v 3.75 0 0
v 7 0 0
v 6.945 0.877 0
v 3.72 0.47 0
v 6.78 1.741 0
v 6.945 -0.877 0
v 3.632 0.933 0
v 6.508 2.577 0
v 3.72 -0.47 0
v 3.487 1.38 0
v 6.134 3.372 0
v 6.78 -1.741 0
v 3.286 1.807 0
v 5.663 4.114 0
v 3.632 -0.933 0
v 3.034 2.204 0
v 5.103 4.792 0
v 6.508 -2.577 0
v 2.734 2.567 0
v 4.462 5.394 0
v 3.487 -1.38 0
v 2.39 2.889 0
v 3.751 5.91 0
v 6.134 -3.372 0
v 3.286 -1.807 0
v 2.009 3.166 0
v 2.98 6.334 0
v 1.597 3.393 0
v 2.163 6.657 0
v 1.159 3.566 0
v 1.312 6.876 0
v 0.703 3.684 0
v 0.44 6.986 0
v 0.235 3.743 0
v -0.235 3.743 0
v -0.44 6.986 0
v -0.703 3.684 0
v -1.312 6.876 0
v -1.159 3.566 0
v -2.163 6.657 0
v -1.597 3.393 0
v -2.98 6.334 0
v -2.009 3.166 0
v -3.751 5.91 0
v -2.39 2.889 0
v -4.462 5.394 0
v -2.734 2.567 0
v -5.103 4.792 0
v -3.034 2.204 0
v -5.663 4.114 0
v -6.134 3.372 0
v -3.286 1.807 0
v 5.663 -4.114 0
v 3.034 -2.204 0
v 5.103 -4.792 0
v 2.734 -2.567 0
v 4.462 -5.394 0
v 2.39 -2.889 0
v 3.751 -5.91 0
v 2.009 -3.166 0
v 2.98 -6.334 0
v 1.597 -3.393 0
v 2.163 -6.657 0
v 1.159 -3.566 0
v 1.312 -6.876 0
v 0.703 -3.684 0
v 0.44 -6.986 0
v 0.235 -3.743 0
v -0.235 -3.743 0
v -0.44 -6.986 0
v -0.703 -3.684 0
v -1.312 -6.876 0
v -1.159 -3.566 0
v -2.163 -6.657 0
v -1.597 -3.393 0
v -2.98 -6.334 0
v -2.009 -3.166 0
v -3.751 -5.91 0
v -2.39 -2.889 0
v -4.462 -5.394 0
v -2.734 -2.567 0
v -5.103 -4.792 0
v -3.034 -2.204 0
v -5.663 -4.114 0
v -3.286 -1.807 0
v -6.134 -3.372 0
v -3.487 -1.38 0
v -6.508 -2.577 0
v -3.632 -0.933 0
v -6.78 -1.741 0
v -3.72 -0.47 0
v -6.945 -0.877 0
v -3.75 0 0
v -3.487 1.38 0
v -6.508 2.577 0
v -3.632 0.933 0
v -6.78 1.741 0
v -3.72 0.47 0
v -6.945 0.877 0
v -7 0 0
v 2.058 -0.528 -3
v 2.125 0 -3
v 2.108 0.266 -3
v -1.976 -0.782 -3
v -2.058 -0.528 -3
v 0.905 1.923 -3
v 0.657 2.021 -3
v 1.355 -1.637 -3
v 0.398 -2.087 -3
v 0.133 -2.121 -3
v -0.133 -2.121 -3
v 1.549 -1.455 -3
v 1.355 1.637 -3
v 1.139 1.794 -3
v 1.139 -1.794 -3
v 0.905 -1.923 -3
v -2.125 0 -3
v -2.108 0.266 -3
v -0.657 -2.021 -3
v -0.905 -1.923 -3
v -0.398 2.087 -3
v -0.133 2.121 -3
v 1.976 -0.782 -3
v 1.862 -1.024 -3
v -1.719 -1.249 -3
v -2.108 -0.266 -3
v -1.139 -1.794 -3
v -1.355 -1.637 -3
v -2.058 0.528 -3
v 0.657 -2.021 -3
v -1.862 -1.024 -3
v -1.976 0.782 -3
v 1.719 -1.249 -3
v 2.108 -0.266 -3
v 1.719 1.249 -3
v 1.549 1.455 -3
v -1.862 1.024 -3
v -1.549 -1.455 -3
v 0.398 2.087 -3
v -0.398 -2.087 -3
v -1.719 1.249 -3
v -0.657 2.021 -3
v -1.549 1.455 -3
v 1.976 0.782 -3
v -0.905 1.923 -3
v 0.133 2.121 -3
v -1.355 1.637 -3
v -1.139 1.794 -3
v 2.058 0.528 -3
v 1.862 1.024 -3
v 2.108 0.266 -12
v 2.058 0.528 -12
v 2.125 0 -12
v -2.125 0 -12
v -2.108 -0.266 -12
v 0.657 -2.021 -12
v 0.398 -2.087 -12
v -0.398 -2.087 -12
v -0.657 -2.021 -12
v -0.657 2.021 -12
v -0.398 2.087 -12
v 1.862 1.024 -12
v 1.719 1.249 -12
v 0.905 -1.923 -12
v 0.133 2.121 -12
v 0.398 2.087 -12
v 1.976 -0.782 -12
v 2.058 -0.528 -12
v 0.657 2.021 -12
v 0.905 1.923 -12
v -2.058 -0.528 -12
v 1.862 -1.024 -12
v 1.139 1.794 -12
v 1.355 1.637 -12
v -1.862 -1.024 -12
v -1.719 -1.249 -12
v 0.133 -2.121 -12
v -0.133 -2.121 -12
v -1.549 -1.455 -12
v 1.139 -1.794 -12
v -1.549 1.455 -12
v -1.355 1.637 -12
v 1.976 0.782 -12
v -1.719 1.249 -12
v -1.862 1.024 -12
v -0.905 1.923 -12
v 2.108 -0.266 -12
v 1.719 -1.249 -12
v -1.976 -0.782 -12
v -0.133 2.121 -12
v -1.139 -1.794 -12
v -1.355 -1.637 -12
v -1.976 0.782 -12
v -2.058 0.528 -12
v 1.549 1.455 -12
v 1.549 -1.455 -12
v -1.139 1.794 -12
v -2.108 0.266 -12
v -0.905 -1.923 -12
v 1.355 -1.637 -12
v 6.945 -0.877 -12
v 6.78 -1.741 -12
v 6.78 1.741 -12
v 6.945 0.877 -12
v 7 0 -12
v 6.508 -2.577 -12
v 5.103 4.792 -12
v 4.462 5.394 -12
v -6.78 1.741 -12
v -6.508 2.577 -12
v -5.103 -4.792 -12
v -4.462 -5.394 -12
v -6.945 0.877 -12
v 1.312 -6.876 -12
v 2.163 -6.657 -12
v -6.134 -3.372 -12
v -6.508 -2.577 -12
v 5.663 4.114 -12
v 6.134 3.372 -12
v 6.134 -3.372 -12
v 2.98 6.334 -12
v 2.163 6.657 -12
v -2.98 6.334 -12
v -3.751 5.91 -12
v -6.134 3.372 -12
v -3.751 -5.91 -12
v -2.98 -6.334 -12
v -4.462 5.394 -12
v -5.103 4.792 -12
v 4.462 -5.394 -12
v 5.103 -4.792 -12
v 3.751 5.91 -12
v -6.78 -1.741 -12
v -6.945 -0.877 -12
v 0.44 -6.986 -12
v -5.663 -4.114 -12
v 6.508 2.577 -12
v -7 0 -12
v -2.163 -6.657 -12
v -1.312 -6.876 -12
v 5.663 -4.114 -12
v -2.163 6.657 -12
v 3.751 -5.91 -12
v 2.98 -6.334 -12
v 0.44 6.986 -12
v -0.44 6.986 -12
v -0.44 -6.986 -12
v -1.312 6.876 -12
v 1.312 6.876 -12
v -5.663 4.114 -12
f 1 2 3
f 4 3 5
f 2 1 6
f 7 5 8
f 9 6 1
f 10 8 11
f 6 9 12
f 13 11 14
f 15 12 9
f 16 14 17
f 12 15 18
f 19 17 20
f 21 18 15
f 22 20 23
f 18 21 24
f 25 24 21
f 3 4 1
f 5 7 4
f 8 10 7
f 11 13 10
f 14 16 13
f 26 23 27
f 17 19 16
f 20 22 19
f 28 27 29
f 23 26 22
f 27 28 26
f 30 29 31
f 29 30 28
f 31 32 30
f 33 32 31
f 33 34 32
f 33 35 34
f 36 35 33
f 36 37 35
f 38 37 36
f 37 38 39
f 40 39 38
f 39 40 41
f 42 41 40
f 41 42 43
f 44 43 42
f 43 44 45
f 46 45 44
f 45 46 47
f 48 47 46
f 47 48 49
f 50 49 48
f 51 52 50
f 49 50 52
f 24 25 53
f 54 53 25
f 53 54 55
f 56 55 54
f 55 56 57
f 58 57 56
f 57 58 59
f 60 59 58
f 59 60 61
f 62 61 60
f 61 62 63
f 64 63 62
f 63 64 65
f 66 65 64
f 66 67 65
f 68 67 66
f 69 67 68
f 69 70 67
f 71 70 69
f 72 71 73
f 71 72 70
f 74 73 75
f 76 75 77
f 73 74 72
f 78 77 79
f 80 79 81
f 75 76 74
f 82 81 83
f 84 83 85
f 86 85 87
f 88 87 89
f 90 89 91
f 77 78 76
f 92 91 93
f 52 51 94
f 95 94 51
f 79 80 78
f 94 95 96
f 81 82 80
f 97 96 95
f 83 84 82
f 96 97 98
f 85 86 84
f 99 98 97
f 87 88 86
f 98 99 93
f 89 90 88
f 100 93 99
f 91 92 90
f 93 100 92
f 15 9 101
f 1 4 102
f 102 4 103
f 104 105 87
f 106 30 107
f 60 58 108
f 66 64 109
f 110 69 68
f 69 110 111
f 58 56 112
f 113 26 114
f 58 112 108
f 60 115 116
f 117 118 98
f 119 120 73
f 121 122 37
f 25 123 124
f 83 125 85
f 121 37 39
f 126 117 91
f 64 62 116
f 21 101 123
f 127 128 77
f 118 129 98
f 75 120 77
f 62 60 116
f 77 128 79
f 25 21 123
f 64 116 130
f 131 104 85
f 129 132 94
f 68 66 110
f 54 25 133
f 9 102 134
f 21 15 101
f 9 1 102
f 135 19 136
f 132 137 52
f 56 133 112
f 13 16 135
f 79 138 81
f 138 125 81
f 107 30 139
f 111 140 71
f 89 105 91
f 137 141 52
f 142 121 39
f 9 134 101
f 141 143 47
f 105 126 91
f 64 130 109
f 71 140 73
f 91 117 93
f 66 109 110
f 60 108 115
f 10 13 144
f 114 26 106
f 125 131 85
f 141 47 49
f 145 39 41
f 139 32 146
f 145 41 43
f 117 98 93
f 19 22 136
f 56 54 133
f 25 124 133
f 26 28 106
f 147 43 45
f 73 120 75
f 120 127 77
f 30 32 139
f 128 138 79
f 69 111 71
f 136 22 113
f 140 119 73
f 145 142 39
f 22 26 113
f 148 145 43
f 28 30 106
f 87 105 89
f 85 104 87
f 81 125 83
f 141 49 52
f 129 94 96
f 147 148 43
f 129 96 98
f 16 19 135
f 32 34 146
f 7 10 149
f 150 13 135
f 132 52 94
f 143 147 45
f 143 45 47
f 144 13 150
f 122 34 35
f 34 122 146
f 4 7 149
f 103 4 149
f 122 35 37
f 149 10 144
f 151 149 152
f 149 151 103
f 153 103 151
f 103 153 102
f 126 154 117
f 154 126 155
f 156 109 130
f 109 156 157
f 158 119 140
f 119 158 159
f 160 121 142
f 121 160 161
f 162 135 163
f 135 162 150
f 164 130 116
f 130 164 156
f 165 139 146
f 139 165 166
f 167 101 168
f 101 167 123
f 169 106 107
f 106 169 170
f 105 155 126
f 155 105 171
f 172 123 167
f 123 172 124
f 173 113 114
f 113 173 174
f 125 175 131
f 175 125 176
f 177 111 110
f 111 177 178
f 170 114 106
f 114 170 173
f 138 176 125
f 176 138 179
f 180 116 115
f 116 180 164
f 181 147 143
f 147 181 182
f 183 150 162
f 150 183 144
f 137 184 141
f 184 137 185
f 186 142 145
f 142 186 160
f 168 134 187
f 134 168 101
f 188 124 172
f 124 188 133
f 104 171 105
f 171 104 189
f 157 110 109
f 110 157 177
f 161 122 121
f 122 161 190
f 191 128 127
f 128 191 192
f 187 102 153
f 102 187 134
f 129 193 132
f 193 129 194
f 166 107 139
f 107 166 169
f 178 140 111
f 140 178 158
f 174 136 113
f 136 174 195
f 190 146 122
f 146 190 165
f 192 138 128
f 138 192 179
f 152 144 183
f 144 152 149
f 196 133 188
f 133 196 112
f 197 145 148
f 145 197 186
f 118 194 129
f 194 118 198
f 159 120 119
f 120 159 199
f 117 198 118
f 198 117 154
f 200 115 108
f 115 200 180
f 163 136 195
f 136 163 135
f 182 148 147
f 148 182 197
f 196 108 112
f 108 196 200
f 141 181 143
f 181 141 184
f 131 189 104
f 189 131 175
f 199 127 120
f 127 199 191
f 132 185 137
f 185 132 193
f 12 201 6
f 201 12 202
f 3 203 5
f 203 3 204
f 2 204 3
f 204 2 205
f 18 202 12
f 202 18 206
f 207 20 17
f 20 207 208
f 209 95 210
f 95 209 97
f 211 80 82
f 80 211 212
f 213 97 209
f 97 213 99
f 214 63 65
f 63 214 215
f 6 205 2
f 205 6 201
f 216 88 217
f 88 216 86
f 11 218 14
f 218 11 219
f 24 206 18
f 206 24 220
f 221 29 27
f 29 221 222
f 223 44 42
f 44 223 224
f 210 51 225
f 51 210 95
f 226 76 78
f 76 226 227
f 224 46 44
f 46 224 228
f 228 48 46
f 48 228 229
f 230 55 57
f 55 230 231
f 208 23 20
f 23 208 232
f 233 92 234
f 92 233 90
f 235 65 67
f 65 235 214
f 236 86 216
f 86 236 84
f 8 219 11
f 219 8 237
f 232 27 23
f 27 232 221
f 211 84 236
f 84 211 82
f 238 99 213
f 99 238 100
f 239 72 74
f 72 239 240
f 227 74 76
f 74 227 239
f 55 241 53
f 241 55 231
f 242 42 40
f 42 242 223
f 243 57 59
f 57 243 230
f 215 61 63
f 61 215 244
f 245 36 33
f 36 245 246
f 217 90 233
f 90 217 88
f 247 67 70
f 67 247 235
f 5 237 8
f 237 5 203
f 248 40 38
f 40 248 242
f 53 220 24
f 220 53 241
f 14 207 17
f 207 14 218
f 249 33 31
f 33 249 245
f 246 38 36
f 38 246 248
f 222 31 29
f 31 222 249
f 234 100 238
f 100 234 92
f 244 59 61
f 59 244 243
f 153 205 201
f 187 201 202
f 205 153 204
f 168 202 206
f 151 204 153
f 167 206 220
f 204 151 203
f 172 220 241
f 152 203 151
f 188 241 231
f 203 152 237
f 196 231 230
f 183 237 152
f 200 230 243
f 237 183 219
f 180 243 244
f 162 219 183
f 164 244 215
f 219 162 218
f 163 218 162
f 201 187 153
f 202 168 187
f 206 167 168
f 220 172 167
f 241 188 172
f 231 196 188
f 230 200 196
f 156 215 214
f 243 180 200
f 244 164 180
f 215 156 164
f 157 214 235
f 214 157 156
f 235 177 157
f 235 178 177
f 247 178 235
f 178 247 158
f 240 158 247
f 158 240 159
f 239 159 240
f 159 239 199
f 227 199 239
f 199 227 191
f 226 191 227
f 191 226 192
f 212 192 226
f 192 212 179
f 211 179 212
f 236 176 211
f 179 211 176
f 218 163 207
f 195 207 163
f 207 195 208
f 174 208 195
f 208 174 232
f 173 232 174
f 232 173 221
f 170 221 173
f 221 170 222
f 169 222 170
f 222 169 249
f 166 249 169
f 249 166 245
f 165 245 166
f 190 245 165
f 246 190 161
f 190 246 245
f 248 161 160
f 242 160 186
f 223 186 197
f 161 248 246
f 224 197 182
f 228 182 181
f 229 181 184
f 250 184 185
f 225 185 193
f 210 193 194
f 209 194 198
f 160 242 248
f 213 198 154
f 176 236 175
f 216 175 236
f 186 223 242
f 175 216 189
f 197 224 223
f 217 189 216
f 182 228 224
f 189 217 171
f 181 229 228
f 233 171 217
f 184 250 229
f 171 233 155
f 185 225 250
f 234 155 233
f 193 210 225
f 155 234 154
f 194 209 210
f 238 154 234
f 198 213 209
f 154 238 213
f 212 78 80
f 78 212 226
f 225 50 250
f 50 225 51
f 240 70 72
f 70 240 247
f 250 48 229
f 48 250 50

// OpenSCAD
$fn = 50;

difference() {
	union() {
		translate(v = [0, 0, -12.0]) {
			cylinder(h = 12, r = 7.0);
		}
	}
	union() {
		translate(v = [0, 0, 0]) {
			rotate(a = [0, 0, 0]) {
				difference() {
					union() {
						translate(v = [0, 0, -15.0]) {
							cylinder(h = 15, r = 2.0);
						}
						translate(v = [0, 0, -3]) {
							cylinder(h = 3, r1 = 2.125, r2 = 3.75);
						}
						translate(v = [0, 0, -15.0]) {
							cylinder(h = 15, r = 2.125);
						}
						translate(v = [0, 0, -15.0]) {
							cylinder(h = 15, r = 2.0);
						}
					}
					union();
				}
			}
		}
	}
}
